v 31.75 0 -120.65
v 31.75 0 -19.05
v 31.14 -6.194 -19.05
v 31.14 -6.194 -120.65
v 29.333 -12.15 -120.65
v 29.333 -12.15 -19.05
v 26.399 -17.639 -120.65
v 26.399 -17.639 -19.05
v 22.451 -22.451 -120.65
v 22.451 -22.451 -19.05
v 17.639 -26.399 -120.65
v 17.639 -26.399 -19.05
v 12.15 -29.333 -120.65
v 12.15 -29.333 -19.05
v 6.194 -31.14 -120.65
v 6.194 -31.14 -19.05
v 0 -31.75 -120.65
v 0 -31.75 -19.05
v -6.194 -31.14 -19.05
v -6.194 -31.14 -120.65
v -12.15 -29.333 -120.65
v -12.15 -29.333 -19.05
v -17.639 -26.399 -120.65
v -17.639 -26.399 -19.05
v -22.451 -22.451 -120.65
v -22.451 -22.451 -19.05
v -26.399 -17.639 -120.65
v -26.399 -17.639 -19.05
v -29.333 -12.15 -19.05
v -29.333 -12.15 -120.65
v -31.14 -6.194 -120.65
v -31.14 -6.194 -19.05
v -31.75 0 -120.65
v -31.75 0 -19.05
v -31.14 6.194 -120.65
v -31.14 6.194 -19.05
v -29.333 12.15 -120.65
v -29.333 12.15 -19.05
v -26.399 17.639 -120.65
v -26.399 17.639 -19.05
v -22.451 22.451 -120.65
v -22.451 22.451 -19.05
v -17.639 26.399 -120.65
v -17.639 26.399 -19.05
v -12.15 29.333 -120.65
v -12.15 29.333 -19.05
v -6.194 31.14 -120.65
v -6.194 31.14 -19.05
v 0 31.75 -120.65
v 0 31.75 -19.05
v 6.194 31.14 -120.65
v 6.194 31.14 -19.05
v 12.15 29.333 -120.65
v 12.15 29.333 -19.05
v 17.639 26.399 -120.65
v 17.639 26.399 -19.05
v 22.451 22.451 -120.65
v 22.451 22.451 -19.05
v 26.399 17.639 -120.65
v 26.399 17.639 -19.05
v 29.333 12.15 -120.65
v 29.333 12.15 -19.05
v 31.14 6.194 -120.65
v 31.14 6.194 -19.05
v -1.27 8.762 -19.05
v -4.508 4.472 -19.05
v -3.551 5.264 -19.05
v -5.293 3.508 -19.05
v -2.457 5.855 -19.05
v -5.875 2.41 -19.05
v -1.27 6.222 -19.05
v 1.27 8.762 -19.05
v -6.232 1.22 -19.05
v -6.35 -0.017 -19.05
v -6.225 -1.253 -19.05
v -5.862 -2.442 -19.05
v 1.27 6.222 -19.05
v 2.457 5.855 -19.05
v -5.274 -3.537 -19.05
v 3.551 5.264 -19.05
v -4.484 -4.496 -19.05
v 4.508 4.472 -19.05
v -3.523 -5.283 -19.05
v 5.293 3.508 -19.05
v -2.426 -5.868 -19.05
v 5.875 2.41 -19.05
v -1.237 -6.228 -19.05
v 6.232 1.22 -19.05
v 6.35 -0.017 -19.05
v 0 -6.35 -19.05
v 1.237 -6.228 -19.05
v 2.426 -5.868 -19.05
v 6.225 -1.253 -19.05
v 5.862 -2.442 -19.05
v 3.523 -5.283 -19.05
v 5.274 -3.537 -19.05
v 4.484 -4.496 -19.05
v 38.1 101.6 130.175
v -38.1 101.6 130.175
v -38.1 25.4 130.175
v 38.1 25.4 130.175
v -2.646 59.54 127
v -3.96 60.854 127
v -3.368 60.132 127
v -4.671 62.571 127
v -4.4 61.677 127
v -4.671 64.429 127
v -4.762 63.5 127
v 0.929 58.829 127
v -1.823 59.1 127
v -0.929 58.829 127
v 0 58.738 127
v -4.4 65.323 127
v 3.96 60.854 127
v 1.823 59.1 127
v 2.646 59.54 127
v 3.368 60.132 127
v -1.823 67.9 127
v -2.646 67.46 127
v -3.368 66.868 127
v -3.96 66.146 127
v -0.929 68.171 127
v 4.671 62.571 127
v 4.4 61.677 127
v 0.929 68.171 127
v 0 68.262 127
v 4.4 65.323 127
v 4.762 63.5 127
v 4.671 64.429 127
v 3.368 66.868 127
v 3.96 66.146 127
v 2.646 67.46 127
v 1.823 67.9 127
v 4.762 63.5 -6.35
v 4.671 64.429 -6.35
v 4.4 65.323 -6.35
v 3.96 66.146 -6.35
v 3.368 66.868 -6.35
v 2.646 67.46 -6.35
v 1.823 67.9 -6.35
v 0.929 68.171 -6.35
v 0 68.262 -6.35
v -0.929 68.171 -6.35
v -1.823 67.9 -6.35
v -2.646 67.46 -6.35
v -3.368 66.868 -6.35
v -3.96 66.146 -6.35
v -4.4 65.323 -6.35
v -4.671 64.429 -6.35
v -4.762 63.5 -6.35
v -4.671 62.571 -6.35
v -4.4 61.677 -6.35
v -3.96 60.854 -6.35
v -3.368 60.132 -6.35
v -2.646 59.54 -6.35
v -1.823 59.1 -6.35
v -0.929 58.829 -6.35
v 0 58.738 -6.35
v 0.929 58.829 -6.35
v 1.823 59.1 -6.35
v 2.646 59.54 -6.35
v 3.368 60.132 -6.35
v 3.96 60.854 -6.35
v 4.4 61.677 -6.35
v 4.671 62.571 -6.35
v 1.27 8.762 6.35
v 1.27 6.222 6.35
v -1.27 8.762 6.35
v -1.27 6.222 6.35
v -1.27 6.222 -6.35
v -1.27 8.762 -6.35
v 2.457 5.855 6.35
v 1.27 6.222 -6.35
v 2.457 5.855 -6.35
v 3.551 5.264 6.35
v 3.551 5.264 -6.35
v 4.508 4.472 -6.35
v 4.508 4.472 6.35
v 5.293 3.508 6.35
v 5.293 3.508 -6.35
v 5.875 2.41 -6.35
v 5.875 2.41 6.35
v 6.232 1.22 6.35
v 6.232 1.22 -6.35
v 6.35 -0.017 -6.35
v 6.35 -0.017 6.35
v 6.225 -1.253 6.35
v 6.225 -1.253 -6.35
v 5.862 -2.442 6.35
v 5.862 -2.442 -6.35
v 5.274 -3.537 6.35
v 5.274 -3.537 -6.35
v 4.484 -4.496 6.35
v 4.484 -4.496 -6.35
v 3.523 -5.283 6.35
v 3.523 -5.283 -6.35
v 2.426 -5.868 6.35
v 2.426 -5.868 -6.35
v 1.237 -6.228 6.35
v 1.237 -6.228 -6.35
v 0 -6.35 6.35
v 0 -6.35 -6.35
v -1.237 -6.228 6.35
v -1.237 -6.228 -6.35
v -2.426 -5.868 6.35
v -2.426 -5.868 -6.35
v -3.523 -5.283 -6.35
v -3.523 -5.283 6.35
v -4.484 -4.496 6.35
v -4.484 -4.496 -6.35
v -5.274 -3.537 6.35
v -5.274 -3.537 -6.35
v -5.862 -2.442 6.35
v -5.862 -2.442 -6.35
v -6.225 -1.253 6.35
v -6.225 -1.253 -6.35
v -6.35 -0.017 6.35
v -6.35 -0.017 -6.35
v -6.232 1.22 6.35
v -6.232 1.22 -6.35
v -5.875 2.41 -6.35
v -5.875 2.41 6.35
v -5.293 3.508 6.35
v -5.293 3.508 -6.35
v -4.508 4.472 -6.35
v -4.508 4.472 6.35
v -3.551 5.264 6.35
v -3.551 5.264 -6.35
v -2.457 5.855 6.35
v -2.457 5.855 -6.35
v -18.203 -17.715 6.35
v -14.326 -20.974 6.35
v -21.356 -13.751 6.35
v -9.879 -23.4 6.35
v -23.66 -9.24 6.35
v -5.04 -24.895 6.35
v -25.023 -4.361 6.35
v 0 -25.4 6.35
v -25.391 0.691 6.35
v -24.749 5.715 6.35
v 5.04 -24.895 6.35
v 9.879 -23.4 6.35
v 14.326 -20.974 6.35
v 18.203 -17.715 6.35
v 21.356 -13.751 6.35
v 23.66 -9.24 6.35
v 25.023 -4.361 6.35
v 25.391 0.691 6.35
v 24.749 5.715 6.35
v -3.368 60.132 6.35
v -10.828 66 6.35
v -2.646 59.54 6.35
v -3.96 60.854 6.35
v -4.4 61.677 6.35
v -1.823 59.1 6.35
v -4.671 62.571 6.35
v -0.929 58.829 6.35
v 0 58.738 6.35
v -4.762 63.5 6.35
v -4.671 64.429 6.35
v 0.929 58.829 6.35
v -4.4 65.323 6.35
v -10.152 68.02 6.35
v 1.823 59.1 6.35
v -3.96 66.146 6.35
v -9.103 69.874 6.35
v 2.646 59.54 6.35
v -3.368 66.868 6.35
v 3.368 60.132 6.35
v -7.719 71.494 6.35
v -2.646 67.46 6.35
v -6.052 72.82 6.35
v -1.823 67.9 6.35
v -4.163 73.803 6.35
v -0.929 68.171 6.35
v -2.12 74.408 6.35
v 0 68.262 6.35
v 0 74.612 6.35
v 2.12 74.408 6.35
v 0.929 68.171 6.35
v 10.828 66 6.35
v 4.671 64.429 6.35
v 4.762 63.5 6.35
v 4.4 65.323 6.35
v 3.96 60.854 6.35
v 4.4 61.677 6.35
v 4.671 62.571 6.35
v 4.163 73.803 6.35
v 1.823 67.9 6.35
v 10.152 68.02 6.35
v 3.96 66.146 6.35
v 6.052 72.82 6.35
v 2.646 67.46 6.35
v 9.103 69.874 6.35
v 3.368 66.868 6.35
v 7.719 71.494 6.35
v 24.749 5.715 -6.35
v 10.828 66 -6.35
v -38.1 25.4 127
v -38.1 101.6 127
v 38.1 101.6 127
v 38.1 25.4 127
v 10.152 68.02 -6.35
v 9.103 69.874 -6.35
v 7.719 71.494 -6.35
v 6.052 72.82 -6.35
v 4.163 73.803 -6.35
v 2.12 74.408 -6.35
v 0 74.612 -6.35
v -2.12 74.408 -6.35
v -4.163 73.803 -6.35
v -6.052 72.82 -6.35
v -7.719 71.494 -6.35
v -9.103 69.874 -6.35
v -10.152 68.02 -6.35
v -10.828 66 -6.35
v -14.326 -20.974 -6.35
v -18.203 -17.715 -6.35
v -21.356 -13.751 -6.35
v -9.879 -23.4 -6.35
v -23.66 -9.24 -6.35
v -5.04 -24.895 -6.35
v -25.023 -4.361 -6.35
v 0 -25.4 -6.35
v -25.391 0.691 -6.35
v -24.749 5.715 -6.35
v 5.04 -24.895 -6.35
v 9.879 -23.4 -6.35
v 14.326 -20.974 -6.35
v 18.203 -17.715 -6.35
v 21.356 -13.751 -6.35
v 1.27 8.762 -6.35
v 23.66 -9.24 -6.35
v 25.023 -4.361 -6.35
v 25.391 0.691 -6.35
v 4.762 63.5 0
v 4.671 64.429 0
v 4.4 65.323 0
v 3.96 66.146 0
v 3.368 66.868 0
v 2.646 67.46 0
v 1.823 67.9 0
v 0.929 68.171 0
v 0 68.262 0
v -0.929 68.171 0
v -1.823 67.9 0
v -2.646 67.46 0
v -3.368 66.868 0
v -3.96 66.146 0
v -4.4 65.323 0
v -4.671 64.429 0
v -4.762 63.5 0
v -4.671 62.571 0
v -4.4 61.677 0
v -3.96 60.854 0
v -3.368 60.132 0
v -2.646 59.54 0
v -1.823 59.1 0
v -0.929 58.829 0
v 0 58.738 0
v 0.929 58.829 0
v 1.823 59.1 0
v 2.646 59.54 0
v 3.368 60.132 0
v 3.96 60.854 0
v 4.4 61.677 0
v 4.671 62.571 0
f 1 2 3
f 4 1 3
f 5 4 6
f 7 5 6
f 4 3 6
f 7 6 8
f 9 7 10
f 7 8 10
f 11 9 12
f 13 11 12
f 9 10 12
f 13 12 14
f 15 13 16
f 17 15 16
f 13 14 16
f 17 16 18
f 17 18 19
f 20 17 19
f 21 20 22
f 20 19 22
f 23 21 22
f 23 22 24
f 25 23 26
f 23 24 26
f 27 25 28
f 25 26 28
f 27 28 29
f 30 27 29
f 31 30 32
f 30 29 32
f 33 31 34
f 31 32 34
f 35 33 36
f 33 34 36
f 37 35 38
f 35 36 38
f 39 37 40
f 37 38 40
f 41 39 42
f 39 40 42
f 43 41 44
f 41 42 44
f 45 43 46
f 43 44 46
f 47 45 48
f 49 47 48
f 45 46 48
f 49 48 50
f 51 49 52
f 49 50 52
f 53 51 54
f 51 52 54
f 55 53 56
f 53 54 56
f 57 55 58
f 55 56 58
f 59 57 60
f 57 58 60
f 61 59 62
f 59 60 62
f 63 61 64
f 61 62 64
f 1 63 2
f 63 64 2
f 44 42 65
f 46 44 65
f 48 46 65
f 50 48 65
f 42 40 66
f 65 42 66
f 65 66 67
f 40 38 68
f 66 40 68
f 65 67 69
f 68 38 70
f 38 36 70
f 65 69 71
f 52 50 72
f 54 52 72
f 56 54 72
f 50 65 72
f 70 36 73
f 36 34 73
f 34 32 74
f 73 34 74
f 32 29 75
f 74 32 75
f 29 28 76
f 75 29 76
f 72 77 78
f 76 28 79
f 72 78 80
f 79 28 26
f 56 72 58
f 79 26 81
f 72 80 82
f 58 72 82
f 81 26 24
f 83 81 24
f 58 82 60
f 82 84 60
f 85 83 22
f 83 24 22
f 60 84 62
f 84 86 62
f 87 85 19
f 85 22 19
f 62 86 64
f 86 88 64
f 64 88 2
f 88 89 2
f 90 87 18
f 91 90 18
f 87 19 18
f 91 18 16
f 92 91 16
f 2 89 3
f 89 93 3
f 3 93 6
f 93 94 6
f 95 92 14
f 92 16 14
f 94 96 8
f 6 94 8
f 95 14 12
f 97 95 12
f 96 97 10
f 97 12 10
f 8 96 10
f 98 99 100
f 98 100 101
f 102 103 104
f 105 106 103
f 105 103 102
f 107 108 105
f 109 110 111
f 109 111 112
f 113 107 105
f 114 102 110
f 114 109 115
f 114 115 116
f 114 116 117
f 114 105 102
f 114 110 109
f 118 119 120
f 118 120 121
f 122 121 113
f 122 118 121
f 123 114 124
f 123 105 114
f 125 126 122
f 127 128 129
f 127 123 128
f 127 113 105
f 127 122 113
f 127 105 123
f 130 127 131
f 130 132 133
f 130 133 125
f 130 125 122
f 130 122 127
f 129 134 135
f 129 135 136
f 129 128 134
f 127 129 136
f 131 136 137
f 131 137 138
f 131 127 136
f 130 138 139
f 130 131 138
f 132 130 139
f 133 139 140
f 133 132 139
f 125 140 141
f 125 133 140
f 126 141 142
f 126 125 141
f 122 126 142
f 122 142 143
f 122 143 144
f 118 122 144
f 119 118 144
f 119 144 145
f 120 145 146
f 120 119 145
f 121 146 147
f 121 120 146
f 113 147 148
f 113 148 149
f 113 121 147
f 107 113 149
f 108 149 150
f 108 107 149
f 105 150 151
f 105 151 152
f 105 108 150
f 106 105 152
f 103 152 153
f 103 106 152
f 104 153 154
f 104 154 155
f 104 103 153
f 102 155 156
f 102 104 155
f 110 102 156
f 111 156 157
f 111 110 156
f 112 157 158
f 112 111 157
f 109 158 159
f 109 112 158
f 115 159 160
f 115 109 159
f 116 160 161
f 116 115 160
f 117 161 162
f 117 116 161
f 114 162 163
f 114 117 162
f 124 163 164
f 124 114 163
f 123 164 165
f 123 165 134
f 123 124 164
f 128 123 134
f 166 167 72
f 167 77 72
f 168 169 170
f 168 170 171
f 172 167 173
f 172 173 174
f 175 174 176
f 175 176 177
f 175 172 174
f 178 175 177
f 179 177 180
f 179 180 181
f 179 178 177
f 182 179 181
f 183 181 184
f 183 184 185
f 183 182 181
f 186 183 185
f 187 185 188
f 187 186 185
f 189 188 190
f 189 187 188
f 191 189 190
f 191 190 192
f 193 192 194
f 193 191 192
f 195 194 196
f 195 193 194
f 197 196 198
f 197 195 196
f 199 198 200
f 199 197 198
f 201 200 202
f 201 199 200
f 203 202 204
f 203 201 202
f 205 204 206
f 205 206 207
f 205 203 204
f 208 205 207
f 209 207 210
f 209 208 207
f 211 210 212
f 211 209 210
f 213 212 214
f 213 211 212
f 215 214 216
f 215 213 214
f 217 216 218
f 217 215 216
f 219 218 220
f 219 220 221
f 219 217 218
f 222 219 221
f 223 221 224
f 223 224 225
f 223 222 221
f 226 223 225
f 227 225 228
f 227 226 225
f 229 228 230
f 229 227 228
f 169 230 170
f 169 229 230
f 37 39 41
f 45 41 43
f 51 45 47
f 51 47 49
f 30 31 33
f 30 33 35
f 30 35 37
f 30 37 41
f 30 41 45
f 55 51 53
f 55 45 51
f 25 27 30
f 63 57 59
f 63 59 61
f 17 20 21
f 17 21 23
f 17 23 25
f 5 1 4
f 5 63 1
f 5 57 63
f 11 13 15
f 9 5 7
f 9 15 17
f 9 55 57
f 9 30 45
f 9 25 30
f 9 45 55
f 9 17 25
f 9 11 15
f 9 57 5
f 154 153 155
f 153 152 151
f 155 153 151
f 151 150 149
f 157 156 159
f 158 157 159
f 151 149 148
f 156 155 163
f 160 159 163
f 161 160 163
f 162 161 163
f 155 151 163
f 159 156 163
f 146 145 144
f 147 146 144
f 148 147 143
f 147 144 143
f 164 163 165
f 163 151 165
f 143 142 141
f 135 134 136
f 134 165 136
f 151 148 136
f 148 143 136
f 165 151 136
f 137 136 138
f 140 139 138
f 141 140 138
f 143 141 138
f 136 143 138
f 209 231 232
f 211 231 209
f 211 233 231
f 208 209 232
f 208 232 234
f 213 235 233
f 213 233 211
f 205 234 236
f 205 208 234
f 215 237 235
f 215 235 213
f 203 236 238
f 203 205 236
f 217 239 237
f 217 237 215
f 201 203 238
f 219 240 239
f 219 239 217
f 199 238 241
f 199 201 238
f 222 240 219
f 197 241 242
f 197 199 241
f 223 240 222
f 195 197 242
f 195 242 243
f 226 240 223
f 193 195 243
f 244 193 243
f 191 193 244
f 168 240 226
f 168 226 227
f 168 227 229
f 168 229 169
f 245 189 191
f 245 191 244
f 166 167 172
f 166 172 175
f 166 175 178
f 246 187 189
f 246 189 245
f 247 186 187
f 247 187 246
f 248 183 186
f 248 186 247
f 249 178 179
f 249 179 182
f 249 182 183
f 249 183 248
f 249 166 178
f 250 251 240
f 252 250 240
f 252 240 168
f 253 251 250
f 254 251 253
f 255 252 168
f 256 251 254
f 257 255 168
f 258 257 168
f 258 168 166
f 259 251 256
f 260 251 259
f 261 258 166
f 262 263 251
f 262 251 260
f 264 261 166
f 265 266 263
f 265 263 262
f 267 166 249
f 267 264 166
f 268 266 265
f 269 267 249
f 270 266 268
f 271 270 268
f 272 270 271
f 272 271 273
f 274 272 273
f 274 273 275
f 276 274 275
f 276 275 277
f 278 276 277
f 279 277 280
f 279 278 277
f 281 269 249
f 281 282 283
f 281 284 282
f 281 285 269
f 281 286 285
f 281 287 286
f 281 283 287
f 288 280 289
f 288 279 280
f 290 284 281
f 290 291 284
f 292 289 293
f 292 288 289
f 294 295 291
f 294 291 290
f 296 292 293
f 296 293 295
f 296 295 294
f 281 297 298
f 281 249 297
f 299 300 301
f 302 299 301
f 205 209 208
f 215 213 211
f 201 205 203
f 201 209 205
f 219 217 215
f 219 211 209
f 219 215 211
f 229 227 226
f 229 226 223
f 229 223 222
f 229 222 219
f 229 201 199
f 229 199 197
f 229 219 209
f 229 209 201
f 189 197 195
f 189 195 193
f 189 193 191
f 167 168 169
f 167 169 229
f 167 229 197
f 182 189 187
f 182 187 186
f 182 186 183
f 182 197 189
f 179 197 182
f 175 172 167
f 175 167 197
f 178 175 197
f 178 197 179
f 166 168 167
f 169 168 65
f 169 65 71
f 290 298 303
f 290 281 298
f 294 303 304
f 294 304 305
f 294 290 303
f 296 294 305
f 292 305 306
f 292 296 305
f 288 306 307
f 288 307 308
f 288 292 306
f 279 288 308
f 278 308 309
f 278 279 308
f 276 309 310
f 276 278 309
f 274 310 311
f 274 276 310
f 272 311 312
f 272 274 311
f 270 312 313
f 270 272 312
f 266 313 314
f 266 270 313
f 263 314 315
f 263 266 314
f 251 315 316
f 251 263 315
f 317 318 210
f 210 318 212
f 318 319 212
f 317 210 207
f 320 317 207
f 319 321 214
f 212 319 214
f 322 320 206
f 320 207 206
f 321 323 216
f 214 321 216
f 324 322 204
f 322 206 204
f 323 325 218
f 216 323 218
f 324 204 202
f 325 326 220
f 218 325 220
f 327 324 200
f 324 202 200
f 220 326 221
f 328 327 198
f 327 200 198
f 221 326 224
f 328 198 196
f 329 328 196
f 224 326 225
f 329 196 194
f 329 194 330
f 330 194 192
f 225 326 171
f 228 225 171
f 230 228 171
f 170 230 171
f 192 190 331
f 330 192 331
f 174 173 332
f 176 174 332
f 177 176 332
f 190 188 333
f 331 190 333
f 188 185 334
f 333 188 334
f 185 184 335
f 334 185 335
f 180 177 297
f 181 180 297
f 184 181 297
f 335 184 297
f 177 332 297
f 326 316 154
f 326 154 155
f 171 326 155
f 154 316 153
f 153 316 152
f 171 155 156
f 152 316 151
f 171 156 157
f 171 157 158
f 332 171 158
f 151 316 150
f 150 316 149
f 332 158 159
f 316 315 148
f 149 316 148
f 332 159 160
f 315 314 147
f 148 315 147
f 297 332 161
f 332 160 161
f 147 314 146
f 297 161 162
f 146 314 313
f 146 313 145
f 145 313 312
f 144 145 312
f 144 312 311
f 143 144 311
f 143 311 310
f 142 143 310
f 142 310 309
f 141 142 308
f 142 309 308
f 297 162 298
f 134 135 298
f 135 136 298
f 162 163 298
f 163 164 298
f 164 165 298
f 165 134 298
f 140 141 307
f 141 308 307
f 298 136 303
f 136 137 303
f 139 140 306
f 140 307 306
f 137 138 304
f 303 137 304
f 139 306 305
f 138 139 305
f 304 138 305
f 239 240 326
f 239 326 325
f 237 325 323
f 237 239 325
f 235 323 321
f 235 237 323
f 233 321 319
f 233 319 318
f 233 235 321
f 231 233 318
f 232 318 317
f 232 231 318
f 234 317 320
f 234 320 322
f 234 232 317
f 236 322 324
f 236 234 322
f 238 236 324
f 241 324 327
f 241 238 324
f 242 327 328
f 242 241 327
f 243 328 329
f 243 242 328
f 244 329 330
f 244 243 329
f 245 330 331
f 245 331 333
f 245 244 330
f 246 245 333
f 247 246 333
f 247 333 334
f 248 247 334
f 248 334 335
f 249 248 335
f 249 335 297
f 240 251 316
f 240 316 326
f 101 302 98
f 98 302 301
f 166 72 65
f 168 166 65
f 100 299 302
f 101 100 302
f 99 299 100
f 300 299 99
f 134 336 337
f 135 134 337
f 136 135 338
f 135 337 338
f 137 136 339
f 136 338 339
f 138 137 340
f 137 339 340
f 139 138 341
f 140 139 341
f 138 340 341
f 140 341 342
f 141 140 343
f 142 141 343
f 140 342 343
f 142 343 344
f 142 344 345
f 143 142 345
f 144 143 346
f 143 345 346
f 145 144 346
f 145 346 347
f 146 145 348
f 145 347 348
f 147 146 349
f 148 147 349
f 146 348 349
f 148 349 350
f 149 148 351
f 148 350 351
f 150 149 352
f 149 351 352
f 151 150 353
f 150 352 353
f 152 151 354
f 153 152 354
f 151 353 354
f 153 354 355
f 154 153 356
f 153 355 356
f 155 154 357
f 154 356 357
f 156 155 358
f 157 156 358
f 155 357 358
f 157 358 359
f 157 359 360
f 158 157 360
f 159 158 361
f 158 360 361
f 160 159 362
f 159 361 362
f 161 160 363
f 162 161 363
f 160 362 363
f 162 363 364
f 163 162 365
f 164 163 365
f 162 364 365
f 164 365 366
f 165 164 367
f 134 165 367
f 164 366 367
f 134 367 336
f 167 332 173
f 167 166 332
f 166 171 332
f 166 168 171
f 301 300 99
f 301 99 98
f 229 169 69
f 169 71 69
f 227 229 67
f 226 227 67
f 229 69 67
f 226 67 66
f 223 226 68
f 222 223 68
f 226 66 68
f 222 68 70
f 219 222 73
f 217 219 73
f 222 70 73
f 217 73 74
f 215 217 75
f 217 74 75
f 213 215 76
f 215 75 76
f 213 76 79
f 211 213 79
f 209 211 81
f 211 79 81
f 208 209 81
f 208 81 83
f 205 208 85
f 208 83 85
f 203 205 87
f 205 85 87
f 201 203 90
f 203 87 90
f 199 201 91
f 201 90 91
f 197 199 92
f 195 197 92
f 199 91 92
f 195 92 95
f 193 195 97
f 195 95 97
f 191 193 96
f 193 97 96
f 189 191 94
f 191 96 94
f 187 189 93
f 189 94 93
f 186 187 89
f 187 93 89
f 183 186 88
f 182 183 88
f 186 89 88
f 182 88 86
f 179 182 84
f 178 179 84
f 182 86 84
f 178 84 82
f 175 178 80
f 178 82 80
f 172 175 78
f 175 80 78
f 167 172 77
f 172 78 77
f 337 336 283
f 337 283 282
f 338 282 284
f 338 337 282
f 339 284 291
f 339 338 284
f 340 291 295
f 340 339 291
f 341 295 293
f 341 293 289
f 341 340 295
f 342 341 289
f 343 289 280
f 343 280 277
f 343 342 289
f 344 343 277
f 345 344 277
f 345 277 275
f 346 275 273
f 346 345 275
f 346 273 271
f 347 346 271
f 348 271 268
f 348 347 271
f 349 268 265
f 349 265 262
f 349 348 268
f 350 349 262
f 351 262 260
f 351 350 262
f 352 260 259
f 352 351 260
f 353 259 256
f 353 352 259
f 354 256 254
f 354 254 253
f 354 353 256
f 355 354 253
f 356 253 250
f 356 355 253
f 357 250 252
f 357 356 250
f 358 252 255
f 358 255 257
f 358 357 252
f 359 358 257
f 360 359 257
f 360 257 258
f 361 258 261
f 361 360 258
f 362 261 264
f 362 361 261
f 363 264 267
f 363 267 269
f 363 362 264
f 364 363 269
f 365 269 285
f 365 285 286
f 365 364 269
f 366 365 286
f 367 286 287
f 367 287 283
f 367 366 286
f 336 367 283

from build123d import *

# Parameters (mm, degrees)
F1_DEPTH      = 19.05
F1_DEPTH_BACK = 6.35
F2_R          = 31.75
F3_DEPTH      = 101.6
F4_R          = 4.7625
F5_DEPTH      = 127
F5_DEPTH_BACK = 6.35
F6_R          = 4.7625
F7_DEPTH      = 6.35
F7_DEPTH_BACK = 6.35
F8_W          = 76.2
F8_H          = 76.2
F9_DEPTH      = 3.175


with BuildPart() as f1:
    # F0 (on Top) → F1 (new body, two sides)
    with BuildSketch(Plane.XY) as f1_sk:
        with BuildLine():
            Line((-1.27, 8.7617039467), (-1.27, 6.2217039467))
            ThreePointArc((-1.27, 6.2217039467), (0, -6.35), (1.27, 6.2217039467))
            Line((1.27, 6.2217039467), (1.27, 8.7617039467))
            Line((1.27, 8.7617039467), (-1.27, 8.7617039467))
        make_face()
    extrude(amount=-F1_DEPTH)
    extrude(f1_sk.sketch, amount=F1_DEPTH_BACK)

    # F2 (on face) → F3 (join)
    with BuildSketch(Plane(origin=(0, 0, -19.05), x_dir=(1, 0, 0), z_dir=(0, 0, -1))):
        Circle(F2_R)
    extrude(amount=F3_DEPTH)


with BuildPart() as f5:
    # F4 (on Top) → F5 (new body, two sides)
    with BuildSketch(Plane.XY) as f5_sk:
        with Locations((0, 63.5)):
            Circle(F4_R)
    extrude(amount=F5_DEPTH)
    extrude(f5_sk.sketch, amount=-F5_DEPTH_BACK)


with BuildPart() as f7:
    # F6 (on Top) → F7 (new body, two sides)
    with BuildSketch(Plane.XY) as f7_sk:
        with BuildLine():
            ThreePointArc((10.8275617593, 66.0003125), (0, 74.6125), (-10.8275617593, 66.0003125))
            Line((-10.8275617593, 66.0003125), (-24.7487125928, 5.715))
            ThreePointArc((-24.7487125928, 5.715), (0, -25.4), (24.7487125928, 5.715))
            Line((24.7487125928, 5.715), (10.8275617593, 66.0003125))
        make_face()
        with BuildLine():
            ThreePointArc((1.27, 6.2217039467), (0, -6.35), (-1.27, 6.2217039467))
            Line((-1.27, 6.2217039467), (-1.27, 8.7617039467))
            Line((-1.27, 8.7617039467), (1.27, 8.7617039467))
            Line((1.27, 8.7617039467), (1.27, 6.2217039467))
        make_face(mode=Mode.SUBTRACT)
        with Locations((0, 63.5)):
            Circle(F6_R, mode=Mode.SUBTRACT)
    extrude(amount=F7_DEPTH)
    extrude(f7_sk.sketch, amount=-F7_DEPTH_BACK)


with BuildPart() as f9:
    # F8 (on face) → F9 (new body)
    with BuildSketch(Plane.XY.offset(127)):
        with Locations((0, 63.5)):
            Rectangle(F8_W, F8_H)
    extrude(amount=F9_DEPTH)


solid = Compound([f1.part, f5.part, f7.part, f9.part])
